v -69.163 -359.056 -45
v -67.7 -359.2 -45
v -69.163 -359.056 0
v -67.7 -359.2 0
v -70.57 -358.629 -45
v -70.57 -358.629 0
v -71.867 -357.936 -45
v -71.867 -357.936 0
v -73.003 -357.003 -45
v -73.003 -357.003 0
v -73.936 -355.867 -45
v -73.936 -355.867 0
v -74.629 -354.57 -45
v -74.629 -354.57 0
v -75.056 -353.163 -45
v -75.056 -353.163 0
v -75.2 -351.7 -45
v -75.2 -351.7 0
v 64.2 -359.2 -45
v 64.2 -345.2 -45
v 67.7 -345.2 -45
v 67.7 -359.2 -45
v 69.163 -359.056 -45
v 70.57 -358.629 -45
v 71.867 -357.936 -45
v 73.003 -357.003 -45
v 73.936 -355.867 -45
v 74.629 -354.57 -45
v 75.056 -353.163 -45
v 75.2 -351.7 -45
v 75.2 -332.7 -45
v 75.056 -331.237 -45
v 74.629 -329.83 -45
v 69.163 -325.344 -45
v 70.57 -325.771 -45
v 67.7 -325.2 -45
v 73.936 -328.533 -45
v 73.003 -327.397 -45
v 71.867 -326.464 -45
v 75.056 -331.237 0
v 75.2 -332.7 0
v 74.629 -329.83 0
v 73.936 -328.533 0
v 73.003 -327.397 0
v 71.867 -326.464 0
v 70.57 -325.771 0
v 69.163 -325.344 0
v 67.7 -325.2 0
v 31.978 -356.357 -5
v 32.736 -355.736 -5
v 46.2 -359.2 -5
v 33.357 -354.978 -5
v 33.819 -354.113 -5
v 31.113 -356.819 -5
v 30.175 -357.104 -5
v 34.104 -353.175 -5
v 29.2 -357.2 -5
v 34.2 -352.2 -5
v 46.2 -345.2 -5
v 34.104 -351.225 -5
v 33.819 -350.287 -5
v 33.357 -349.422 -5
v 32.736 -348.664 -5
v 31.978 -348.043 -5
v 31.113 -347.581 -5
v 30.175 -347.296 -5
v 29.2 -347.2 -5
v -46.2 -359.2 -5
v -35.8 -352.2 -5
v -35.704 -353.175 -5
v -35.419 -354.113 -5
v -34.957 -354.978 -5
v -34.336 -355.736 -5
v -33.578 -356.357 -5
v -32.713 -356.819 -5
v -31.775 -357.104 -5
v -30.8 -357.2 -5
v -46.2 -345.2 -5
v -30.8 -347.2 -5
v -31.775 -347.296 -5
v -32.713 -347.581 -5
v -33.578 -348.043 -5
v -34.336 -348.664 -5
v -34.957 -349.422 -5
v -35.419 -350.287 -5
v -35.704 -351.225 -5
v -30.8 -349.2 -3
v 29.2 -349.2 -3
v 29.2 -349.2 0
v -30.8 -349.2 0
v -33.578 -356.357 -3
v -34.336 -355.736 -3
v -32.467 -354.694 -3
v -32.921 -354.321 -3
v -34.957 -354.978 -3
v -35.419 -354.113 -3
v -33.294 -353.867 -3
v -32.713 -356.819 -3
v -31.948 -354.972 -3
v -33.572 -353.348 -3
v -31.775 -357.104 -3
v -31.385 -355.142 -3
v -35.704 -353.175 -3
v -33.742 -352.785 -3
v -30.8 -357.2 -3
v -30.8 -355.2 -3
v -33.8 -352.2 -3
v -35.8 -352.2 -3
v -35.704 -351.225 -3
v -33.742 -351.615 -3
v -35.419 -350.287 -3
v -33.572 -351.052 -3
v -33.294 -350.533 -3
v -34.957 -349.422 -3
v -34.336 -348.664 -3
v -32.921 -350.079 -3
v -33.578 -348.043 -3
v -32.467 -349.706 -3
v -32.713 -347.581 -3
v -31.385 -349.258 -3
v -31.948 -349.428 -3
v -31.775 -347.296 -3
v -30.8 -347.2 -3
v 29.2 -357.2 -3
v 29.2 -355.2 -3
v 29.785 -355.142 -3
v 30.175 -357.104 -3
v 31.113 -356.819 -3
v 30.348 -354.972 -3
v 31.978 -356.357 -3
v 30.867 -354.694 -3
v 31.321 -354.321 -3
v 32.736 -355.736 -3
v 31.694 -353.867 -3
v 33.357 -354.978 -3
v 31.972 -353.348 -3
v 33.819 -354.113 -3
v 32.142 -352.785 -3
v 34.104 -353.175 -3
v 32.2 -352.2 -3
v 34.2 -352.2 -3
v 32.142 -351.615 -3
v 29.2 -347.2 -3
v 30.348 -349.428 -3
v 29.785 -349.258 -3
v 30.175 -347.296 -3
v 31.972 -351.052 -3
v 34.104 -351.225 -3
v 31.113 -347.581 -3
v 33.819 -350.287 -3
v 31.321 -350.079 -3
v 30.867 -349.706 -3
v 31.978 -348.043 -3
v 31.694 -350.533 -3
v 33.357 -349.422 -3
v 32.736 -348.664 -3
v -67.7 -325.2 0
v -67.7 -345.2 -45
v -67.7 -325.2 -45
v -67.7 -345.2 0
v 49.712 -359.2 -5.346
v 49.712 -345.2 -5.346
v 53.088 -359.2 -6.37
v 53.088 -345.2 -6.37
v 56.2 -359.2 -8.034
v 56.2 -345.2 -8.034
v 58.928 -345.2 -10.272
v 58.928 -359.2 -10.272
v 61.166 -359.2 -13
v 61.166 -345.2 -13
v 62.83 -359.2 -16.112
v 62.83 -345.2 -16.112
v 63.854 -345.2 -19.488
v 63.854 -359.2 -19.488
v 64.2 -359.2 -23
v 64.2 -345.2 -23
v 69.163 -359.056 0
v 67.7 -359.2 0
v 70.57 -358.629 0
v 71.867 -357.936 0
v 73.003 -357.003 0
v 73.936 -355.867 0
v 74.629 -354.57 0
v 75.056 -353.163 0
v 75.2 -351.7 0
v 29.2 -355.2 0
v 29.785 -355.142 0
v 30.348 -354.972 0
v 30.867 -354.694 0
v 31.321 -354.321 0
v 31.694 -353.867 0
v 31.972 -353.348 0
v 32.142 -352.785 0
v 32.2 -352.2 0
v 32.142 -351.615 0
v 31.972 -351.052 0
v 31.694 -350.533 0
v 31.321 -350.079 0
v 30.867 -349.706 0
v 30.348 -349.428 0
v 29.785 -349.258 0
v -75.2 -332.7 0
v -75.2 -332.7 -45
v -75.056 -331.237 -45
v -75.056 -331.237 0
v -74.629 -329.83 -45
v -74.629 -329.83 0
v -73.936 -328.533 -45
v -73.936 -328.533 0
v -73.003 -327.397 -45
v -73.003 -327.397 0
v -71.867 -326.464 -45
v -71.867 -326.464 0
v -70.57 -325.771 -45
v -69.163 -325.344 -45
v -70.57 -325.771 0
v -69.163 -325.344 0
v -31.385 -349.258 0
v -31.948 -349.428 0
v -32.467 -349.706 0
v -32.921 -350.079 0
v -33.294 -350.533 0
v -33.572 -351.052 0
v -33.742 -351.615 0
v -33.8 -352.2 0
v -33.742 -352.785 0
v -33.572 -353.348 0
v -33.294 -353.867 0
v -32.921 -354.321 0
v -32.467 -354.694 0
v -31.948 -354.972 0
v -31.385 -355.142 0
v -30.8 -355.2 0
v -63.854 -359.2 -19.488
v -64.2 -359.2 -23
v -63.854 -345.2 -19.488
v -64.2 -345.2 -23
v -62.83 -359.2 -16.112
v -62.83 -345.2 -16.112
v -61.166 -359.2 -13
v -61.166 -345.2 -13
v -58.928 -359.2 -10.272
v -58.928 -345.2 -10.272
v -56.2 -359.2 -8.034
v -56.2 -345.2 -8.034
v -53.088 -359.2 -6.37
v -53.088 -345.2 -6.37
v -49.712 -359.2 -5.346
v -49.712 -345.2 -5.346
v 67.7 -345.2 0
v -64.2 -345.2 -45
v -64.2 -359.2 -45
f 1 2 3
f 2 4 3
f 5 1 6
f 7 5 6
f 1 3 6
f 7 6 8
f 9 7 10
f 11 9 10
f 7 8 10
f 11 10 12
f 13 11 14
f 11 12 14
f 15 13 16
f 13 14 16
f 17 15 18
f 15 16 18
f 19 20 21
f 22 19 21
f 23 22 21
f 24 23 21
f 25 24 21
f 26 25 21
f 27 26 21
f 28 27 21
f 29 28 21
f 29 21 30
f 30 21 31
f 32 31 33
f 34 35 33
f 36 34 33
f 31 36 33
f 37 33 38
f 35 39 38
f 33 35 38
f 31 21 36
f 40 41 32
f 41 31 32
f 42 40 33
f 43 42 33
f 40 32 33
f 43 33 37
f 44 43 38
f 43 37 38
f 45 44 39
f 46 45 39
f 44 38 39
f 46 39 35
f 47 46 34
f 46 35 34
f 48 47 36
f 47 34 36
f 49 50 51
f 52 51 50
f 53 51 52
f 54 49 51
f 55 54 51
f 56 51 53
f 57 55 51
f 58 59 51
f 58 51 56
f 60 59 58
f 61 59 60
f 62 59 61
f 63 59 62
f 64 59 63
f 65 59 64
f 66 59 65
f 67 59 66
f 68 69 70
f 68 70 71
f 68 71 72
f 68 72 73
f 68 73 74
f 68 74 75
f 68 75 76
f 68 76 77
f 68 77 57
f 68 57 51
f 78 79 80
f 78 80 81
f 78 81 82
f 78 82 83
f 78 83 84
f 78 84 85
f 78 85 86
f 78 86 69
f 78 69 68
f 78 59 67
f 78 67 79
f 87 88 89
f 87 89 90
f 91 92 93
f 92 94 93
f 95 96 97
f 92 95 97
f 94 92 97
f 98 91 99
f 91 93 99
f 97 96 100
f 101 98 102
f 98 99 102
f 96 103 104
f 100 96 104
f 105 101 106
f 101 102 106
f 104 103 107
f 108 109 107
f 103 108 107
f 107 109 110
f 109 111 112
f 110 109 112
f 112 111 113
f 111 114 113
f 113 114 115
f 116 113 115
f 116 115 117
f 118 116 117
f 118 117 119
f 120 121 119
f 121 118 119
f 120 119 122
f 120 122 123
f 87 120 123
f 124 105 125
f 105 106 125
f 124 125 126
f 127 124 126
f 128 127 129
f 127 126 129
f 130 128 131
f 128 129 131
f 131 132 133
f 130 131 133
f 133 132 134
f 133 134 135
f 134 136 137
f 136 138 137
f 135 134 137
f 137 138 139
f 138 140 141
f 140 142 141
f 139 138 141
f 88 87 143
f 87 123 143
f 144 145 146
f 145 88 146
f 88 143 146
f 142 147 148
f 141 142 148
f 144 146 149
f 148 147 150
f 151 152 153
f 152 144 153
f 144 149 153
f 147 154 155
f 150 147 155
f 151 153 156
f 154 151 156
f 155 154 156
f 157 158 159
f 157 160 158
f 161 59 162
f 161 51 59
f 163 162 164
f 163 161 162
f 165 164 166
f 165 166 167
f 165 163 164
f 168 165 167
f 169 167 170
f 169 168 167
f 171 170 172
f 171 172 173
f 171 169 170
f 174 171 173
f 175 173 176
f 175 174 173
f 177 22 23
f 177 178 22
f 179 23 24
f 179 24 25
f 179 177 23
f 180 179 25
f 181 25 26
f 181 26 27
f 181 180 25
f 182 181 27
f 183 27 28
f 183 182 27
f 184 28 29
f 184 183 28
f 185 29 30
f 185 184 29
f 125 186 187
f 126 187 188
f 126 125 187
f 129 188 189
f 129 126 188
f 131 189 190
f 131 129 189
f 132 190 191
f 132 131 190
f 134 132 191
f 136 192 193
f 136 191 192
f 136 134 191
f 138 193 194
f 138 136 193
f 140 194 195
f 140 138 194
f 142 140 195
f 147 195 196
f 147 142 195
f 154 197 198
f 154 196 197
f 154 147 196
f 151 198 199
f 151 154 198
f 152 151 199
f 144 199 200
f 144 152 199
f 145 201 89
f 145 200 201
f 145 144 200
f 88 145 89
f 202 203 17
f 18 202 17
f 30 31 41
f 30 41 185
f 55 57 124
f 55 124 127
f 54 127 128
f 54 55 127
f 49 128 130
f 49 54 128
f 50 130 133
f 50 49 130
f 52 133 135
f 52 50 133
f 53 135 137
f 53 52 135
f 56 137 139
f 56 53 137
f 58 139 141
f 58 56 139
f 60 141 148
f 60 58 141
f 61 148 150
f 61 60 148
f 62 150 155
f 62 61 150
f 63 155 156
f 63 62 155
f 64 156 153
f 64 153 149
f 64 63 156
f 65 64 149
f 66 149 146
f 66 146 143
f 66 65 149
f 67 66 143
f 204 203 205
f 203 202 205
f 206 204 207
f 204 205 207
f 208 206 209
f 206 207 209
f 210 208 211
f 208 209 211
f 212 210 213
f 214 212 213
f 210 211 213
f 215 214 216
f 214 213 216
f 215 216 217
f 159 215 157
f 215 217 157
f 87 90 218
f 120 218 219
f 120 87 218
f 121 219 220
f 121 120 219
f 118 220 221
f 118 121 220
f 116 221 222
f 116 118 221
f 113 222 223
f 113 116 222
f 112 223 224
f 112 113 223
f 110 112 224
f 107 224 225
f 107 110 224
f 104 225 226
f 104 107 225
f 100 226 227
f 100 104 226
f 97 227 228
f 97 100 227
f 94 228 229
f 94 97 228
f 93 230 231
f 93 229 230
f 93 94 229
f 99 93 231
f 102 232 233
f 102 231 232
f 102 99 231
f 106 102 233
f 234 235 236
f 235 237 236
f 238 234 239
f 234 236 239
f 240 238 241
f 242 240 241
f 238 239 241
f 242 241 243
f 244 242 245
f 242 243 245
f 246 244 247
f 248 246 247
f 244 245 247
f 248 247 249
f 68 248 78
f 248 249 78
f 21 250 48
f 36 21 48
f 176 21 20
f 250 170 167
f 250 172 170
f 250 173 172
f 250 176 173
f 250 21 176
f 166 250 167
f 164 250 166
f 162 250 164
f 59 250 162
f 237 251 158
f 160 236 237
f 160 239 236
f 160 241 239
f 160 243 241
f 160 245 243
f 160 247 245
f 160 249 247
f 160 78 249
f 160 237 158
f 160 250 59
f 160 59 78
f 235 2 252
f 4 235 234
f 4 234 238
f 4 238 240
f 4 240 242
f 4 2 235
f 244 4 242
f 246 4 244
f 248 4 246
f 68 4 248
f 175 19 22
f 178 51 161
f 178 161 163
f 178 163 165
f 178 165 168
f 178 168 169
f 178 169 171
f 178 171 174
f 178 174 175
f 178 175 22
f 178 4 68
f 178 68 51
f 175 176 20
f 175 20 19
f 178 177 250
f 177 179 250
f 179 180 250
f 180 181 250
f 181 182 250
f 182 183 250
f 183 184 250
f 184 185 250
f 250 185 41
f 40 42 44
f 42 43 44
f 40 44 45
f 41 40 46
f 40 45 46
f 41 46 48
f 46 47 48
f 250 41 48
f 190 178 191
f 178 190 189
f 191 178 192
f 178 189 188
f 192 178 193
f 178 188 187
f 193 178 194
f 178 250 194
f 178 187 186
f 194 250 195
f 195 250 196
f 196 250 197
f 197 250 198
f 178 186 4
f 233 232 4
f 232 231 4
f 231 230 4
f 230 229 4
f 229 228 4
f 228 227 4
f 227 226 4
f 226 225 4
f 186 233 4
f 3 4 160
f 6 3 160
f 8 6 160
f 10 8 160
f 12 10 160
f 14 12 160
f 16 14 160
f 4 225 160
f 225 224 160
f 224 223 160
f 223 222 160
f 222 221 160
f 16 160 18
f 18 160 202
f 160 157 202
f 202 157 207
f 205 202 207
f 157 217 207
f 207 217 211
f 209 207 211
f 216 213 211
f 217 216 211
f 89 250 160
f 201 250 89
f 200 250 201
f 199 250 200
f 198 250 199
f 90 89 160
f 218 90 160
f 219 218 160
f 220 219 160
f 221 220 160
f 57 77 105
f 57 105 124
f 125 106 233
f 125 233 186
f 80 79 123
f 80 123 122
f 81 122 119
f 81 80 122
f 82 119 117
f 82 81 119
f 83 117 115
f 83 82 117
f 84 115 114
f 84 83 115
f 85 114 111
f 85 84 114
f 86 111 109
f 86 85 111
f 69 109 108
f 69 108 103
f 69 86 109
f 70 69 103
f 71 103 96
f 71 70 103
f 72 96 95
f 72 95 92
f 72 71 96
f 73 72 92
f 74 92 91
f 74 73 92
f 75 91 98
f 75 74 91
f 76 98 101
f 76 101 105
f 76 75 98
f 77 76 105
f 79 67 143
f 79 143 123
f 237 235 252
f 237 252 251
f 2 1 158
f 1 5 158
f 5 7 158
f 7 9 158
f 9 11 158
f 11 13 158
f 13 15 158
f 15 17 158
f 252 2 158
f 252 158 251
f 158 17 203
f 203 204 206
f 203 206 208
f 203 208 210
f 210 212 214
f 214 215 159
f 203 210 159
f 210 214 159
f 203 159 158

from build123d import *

# Parameters (mm, degrees)
BOSS_EXTRUDE1_DEPTH = 5
BOSS_EXTRUDE2_DEPTH = 40
CUT_EXTRUDE1_DEPTH  = 2
CUT_EXTRUDE2_DEPTH  = 370.382836634
FILLET1_R           = 18
FILLET2_R           = 7.5


with BuildPart() as part:
    # Sketch1 → Boss-Extrude1 (new body)
    with BuildSketch(Plane.XY):
        Polygon((67.7, -325.2), (75.2, -325.2), (75.2, -359.2), (-75.2, -359.2), (-75.2, -325.2), (-67.7, -325.2), (-67.7, -345.2), (67.7, -345.2), align=None)
    extrude(amount=-BOSS_EXTRUDE1_DEPTH)

    # Sketch2 → Boss-Extrude2 (add)
    with BuildSketch(Plane(origin=(0, 0, -5), x_dir=(-1, 0, 0), z_dir=(0, 0, -1))):
        Polygon((67.7, -325.2), (75.2, -325.2), (75.2, -359.2), (64.2, -359.2), (64.2, -345.2), (67.7, -345.2), align=None)
        Polygon((-75.2, -359.2), (-75.2, -325.2), (-67.7, -325.2), (-67.7, -345.2), (-64.2, -345.2), (-64.2, -359.2), align=None)
    extrude(amount=BOSS_EXTRUDE2_DEPTH)

    # Sketch3 → Cut-Extrude1 (cut)
    with BuildSketch(Plane(origin=(0, 0, -5), x_dir=(-1, 0, 0), z_dir=(0, 0, -1))):
        with BuildLine():
            Line((-29.2, -347.2), (30.8, -347.2))
            ThreePointArc((30.8, -347.2), (35.8, -352.2), (30.8, -357.2))
            Line((30.8, -357.2), (-29.2, -357.2))
            ThreePointArc((-29.2, -357.2), (-34.2, -352.2), (-29.2, -347.2))
        make_face()
    extrude(amount=-CUT_EXTRUDE1_DEPTH, mode=Mode.SUBTRACT)

    # Sketch4 → Cut-Extrude2 (cut, through all)
    with BuildSketch(Plane(origin=(0, 0, -3), x_dir=(-1, 0, 0), z_dir=(0, 0, -1))):
        with BuildLine():
            Line((-29.2, -349.2), (30.8, -349.2))
            ThreePointArc((30.8, -349.2), (33.8, -352.2), (30.8, -355.2))
            Line((30.8, -355.2), (-29.2, -355.2))
            ThreePointArc((-29.2, -355.2), (-32.2, -352.2), (-29.2, -349.2))
        make_face()
    extrude(amount=-CUT_EXTRUDE2_DEPTH, mode=Mode.SUBTRACT)

    # Fillet1
    fillet1_edges = [part.edges().sort_by_distance(p)[0] for p in [
        (-64.2, -352.2, -5),
        (64.2, -352.2, -5),
    ]]
    fillet(fillet1_edges, radius=FILLET1_R)

    # Fillet2
    fillet2_edges = [part.edges().sort_by_distance(p)[0] for p in [
        (75.2, -325.2, -22.5),
        (-75.2, -325.2, -22.5),
        (-75.2, -359.2, -22.5),
        (75.2, -359.2, -22.5),
    ]]
    fillet(fillet2_edges, radius=FILLET2_R - 0.0001)  # a hair under: the kernel refuses the full size


solid = part.part
